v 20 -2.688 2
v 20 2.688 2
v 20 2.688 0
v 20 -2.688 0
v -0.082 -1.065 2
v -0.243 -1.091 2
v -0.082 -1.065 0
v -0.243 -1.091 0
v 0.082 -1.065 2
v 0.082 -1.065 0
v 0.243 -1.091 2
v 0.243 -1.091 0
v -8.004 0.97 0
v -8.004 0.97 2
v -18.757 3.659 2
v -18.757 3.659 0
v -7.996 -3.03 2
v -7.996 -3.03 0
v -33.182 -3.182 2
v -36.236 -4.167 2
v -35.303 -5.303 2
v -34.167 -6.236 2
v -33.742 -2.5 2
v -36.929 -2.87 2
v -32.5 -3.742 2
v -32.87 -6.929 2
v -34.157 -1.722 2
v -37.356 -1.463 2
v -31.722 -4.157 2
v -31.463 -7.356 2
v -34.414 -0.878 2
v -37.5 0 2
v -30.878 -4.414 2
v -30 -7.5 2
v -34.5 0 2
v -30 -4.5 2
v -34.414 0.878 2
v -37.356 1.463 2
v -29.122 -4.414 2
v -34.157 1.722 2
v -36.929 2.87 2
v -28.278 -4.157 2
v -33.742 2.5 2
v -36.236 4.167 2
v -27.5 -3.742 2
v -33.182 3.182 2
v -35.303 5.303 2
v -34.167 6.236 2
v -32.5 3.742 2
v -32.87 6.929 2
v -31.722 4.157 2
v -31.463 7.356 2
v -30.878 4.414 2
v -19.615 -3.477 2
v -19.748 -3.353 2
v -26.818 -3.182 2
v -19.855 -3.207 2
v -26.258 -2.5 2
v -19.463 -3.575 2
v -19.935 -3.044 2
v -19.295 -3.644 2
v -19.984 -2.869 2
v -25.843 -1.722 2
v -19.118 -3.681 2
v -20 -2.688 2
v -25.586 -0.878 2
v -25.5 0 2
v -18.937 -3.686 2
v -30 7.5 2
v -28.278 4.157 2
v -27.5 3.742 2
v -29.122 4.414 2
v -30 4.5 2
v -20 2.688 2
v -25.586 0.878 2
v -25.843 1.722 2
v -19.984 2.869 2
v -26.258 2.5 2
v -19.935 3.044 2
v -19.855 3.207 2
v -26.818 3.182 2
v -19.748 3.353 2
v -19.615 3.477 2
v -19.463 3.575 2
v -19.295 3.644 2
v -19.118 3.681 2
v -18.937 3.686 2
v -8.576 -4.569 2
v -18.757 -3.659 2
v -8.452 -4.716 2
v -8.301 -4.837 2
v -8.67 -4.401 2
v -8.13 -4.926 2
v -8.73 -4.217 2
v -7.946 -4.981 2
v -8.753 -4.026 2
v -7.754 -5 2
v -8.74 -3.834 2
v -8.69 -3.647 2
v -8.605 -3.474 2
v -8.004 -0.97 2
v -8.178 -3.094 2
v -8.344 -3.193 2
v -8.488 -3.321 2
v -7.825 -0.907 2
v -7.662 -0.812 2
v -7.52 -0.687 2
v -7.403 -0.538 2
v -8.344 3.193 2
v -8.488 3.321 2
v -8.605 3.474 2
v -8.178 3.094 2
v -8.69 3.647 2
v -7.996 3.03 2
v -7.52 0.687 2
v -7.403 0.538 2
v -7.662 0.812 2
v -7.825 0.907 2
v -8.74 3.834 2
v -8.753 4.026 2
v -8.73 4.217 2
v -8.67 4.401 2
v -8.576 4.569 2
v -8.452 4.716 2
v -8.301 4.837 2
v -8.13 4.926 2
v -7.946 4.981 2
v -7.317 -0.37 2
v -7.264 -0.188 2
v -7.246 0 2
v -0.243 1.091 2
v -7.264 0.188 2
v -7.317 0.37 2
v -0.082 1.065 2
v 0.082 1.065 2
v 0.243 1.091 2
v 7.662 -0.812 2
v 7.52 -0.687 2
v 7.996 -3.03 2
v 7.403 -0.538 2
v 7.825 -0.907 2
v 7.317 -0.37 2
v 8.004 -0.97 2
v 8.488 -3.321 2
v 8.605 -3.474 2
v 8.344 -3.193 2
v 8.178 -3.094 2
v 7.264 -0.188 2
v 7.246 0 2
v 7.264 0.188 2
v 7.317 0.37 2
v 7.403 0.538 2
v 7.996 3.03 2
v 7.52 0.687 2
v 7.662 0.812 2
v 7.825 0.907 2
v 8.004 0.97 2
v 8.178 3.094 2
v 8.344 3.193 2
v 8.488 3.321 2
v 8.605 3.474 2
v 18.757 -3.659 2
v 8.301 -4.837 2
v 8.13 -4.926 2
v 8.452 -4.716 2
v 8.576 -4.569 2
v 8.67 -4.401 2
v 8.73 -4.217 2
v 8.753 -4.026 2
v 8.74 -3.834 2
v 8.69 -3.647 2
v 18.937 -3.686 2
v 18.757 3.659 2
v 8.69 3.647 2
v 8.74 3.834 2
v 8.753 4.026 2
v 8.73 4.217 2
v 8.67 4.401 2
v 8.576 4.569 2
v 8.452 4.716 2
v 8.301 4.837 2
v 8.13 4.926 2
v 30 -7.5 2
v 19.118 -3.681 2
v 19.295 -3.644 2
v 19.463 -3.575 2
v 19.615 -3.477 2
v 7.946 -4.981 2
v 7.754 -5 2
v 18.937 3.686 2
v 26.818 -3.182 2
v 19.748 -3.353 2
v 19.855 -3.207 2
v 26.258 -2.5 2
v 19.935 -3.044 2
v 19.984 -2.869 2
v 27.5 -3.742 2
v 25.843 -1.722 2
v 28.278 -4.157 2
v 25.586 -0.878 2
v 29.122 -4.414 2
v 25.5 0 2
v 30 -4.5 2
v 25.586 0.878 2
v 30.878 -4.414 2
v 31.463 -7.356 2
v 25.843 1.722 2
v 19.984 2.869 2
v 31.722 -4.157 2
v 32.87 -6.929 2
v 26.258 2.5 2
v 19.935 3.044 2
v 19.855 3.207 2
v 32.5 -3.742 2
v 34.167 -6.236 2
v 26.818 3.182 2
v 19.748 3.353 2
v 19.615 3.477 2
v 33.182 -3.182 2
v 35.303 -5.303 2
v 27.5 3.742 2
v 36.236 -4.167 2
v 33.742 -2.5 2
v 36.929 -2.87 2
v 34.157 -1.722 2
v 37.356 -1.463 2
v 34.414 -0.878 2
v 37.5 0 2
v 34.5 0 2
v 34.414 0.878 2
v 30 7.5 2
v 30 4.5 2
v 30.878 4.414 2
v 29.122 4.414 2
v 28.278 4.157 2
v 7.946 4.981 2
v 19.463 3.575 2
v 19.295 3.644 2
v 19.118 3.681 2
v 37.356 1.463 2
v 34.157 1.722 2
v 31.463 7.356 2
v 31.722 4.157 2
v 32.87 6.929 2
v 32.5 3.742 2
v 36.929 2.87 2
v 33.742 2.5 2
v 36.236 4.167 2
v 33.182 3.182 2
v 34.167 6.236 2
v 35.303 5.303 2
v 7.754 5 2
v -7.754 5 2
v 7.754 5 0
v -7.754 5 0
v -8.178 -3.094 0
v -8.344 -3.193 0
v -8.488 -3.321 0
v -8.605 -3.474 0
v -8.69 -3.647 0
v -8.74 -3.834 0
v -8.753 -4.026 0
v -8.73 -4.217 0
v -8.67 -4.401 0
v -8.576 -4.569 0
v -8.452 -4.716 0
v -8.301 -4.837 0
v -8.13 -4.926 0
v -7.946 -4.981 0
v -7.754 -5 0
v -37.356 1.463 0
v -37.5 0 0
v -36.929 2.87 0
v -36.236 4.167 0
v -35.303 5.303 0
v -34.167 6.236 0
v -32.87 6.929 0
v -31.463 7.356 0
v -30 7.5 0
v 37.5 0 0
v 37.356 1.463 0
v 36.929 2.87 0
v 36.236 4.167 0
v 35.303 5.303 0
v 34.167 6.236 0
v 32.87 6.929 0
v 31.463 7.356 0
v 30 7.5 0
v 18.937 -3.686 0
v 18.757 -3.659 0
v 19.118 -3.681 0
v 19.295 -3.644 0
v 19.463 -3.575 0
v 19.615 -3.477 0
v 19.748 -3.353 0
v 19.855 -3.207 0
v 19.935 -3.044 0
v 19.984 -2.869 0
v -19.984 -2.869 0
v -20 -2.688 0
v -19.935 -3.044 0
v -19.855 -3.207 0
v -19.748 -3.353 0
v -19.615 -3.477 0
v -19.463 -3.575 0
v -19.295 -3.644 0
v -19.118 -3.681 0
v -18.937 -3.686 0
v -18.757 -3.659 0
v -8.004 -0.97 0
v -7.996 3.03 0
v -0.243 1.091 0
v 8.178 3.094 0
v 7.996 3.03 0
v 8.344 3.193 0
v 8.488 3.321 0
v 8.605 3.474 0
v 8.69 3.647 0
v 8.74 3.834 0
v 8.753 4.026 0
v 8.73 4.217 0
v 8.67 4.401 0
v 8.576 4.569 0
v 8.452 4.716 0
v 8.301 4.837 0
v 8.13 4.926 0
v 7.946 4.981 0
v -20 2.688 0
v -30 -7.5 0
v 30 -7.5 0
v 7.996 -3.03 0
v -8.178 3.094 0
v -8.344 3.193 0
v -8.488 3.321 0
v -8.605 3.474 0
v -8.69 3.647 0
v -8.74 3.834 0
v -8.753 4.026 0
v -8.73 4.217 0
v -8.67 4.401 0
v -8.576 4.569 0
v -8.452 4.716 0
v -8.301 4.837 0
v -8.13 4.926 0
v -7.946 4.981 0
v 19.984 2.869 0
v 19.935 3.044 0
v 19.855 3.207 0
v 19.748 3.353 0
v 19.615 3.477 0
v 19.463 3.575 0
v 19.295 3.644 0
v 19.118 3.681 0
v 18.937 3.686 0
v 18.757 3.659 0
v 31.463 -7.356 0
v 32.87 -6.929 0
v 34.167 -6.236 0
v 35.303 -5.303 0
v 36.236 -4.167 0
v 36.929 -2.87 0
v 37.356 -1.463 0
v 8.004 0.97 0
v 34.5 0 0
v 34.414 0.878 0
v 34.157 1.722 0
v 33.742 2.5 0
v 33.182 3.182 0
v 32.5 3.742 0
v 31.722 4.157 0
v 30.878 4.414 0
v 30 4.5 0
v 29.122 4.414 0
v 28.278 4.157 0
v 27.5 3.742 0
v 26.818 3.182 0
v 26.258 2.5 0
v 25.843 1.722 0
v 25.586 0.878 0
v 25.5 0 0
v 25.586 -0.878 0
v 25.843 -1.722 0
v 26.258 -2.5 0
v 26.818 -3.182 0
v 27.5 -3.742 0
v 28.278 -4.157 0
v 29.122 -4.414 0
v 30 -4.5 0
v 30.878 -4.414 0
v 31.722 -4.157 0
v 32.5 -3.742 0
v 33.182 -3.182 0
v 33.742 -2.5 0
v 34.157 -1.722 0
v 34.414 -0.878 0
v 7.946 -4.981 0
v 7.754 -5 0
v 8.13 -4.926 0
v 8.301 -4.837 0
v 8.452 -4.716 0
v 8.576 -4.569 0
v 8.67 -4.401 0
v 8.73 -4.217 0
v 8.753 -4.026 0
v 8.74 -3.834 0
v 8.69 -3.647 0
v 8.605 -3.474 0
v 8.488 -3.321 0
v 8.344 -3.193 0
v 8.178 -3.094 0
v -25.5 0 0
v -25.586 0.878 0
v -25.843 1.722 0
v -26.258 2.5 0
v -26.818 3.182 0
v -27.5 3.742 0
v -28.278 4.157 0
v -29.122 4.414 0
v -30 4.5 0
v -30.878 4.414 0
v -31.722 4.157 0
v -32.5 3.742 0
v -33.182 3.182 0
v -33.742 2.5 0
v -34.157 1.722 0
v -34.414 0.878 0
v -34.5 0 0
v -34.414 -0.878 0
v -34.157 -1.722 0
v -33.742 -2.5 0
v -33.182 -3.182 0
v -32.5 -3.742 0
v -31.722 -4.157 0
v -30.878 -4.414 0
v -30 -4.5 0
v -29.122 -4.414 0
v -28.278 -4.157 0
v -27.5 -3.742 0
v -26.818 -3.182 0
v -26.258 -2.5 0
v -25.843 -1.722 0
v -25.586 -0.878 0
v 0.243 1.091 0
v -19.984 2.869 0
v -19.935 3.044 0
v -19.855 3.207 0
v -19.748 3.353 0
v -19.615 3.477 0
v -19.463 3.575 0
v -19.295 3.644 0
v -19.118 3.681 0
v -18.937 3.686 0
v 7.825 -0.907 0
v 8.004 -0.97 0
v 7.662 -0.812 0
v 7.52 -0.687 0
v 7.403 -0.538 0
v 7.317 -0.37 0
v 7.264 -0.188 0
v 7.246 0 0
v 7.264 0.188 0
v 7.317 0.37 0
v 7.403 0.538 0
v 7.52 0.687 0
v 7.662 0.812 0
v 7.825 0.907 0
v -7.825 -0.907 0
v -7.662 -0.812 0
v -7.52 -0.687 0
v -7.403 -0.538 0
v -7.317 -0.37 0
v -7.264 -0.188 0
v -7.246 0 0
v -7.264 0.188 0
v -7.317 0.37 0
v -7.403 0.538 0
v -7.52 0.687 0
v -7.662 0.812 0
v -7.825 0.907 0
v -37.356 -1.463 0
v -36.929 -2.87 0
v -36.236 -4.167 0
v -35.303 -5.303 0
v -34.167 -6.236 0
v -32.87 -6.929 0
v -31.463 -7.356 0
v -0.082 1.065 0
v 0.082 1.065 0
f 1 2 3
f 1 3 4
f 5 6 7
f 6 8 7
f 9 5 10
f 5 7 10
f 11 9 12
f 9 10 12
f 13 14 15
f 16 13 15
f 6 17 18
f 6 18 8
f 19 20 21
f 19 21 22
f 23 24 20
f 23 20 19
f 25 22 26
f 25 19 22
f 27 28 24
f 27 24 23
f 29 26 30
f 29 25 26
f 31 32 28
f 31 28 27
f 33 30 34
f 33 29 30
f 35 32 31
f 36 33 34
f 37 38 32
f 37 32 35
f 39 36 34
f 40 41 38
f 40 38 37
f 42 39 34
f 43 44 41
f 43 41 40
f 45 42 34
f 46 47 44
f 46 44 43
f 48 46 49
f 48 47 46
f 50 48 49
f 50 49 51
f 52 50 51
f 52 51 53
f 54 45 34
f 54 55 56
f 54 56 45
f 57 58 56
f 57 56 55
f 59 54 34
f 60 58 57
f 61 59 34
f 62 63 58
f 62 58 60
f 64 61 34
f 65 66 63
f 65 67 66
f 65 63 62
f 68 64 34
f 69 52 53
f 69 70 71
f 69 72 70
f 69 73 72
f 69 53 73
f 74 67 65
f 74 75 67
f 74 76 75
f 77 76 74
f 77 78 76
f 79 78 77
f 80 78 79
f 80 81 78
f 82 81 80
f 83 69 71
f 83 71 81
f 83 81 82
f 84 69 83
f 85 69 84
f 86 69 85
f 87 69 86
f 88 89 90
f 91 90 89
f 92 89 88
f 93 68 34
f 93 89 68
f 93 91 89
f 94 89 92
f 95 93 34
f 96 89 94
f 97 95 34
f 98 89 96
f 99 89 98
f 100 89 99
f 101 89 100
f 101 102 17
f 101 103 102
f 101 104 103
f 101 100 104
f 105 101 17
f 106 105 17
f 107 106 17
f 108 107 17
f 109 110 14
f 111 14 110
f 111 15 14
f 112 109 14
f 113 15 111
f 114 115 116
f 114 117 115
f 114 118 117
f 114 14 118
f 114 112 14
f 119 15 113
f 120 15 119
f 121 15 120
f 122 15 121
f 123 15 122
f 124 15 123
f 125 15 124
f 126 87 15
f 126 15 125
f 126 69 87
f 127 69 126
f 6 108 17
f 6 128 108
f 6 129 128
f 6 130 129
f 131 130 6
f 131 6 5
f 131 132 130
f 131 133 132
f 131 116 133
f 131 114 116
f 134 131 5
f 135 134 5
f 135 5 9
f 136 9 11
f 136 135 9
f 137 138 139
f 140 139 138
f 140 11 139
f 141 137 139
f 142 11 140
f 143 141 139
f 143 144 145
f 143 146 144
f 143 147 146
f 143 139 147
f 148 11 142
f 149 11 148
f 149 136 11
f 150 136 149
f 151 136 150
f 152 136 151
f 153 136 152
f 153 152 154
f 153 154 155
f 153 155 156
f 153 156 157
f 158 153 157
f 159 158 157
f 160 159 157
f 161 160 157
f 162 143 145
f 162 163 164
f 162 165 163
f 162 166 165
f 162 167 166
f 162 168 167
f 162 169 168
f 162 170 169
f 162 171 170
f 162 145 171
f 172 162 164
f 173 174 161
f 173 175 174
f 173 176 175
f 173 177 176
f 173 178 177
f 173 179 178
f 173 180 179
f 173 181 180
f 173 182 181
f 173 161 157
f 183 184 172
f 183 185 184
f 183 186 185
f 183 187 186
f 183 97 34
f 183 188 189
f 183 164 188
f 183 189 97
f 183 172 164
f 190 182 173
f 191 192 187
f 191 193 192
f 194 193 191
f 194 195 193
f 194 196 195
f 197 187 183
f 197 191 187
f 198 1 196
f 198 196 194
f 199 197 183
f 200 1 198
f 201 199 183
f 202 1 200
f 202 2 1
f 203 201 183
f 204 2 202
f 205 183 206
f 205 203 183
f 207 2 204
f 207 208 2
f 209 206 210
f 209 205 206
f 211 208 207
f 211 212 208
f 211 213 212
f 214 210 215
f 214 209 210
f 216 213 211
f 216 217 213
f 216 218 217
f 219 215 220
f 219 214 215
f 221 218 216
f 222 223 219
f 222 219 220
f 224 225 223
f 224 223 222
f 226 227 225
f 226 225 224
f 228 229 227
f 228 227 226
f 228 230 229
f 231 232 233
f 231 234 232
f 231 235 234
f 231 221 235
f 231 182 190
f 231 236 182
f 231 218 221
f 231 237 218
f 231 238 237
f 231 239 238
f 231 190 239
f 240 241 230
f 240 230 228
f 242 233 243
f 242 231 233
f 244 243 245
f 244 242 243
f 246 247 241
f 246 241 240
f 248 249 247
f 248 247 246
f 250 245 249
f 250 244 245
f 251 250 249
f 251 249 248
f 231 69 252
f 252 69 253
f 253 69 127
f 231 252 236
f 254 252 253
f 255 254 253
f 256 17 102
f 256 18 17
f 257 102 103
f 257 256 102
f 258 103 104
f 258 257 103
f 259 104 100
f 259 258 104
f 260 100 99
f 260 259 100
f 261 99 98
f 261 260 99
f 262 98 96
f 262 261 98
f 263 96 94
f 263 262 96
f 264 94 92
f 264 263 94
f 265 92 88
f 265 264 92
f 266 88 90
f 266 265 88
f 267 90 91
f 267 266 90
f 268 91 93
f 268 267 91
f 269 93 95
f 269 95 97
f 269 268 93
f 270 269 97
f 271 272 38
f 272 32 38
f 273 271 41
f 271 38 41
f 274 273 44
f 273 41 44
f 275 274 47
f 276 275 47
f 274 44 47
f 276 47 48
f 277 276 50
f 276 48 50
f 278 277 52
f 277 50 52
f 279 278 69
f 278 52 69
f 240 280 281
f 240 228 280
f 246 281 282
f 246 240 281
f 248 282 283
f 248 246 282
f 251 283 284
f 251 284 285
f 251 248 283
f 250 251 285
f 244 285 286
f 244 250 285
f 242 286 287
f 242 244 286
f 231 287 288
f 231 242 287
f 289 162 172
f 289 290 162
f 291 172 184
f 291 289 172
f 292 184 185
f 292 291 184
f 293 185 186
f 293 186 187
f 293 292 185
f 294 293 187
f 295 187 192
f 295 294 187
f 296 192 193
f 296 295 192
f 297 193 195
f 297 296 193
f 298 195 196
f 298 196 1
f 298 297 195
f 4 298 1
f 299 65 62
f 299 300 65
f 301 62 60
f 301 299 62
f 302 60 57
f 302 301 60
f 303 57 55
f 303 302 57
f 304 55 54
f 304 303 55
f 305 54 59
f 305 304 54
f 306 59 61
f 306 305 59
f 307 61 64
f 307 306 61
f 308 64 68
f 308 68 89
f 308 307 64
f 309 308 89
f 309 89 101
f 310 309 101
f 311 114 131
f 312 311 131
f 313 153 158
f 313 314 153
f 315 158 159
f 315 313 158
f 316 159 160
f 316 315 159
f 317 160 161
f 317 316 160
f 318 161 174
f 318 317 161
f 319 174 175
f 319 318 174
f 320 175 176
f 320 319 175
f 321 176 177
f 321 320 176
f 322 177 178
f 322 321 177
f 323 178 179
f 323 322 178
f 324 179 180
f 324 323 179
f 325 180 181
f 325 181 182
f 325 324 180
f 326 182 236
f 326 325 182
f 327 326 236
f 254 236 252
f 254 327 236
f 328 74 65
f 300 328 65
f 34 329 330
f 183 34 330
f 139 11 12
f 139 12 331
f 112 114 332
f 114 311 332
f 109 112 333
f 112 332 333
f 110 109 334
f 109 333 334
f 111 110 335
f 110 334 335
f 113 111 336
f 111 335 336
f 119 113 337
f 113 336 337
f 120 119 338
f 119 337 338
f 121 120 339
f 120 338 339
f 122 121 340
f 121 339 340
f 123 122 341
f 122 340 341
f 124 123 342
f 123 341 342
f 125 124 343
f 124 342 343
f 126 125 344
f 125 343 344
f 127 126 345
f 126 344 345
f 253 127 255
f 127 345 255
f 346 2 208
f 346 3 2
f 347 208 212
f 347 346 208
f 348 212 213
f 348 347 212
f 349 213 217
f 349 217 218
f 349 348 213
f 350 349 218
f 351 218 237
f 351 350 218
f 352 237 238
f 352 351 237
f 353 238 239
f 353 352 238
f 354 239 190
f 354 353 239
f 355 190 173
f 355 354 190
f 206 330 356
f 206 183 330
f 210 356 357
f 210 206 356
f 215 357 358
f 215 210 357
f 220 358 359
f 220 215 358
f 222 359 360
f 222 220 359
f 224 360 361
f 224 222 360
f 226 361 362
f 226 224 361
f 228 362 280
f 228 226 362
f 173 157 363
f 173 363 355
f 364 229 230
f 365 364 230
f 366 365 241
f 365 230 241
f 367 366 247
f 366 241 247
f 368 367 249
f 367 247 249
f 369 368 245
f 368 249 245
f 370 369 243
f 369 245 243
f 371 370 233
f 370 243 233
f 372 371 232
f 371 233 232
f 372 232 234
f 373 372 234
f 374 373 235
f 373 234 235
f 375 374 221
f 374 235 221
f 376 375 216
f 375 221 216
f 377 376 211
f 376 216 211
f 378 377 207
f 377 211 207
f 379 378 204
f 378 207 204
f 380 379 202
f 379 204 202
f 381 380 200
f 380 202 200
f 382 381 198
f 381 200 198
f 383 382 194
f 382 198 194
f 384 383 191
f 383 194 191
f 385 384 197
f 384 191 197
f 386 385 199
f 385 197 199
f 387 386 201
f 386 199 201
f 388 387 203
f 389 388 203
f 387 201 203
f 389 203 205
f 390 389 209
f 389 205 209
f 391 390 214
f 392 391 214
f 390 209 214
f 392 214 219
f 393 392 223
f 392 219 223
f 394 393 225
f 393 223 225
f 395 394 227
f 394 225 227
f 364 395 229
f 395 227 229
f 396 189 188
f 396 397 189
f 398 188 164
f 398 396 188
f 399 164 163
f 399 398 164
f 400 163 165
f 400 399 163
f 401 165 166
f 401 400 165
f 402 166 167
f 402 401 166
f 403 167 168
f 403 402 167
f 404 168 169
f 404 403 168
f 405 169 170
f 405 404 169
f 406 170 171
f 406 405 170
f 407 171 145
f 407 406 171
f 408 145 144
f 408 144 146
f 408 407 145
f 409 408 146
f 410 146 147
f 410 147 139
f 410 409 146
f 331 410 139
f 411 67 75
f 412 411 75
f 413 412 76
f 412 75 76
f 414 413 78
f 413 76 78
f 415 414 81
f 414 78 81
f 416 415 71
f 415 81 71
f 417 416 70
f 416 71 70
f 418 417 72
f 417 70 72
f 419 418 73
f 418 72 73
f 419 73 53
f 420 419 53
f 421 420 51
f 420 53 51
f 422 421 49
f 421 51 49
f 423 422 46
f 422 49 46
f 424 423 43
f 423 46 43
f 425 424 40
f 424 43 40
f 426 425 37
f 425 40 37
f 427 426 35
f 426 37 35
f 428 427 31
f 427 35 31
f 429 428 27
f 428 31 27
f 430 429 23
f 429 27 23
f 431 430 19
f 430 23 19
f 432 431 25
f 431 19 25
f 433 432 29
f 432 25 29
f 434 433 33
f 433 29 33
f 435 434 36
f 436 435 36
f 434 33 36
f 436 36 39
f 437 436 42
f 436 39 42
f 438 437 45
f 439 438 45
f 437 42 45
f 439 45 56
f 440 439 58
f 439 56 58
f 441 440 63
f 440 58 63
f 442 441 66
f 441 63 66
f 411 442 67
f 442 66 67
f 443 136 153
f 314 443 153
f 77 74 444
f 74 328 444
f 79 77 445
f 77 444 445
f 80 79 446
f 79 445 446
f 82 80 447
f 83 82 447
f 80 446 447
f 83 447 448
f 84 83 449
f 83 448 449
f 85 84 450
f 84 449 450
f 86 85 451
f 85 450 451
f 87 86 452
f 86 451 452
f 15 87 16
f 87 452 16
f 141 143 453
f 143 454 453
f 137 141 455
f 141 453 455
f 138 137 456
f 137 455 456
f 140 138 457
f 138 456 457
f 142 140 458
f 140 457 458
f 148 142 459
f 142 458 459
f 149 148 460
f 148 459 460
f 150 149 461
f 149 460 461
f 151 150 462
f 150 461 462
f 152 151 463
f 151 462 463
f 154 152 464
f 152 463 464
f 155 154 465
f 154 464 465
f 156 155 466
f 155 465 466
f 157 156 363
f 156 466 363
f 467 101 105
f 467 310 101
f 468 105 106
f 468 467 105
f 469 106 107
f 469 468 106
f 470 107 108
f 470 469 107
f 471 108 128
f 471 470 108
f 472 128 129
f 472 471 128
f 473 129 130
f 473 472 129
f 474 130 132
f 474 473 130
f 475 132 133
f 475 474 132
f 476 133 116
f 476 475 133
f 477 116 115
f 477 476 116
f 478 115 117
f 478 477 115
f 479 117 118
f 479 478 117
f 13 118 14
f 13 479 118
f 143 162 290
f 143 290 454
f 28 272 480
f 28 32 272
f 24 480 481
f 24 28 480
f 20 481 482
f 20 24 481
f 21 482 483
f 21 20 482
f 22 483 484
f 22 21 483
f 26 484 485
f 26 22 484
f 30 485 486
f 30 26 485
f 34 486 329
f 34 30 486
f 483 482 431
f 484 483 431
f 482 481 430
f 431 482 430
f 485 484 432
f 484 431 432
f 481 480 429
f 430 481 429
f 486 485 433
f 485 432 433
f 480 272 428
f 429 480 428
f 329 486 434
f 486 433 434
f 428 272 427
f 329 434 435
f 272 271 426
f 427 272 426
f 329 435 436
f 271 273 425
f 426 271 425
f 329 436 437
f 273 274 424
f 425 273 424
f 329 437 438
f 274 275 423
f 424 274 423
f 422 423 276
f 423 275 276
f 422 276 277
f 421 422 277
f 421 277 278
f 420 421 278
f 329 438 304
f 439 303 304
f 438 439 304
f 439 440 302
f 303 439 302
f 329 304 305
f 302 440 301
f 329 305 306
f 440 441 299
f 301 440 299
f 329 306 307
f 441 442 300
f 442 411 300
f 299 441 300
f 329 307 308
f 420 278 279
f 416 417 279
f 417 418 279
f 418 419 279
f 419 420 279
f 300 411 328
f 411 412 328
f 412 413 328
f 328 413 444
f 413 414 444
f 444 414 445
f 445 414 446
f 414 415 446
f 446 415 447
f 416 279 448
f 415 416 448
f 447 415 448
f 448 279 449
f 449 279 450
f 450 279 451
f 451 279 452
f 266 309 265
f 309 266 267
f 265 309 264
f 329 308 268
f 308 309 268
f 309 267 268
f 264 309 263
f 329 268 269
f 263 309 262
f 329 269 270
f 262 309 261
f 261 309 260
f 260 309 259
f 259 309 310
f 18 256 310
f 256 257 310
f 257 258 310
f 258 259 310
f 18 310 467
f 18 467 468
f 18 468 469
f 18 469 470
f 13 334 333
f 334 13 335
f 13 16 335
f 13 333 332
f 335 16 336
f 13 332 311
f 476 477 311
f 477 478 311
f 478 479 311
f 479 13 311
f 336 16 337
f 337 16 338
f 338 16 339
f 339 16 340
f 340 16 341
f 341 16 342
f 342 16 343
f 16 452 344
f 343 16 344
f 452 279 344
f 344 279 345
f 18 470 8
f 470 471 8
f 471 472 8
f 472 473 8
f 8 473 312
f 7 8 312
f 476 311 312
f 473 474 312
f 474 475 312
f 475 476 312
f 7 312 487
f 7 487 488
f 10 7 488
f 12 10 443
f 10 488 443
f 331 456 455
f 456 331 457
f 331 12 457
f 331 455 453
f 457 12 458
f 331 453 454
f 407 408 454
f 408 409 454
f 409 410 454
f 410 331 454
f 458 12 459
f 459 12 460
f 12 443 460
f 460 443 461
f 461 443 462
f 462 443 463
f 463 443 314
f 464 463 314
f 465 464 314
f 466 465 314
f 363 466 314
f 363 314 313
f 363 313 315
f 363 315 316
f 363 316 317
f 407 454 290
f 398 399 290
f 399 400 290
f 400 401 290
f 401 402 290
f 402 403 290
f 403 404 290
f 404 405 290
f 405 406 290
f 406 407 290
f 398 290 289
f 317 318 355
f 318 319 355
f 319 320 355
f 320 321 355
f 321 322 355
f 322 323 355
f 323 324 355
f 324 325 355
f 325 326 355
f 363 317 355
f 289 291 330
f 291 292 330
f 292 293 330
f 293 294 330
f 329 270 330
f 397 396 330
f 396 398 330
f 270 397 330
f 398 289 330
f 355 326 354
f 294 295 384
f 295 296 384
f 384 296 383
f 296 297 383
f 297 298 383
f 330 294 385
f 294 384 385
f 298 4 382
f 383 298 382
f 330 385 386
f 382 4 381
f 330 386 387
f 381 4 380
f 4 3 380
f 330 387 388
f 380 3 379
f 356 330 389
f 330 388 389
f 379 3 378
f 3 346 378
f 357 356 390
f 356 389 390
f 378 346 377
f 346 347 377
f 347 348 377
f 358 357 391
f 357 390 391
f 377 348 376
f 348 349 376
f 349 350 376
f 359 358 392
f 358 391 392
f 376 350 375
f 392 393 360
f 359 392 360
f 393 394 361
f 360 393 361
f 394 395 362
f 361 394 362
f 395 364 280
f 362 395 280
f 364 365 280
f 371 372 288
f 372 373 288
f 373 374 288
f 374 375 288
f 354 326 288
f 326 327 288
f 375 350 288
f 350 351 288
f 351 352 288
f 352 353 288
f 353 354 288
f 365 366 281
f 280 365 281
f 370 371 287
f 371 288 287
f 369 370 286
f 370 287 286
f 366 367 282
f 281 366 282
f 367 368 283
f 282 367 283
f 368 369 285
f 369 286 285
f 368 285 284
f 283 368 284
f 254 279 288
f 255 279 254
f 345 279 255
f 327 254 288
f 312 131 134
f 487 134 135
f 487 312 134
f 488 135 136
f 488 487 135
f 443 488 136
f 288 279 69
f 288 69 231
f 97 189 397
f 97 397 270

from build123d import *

# Parameters (mm, degrees)
SKETCH_1_W          = 75
SKETCH_1_H          = 15
EXTRUDE_1_DEPTH     = 2
FILLET_1_R          = 7.5
SKETCH_2_R          = 4.5
CUT_EXTRUDE_1_DEPTH = 2
CUT_EXTRUDE_2_DEPTH = 10
FILLET_2_R          = 1


with BuildPart() as part:
    # 草图1 → 凸台-拉伸1 (new body)
    with BuildSketch(Plane.XY):
        Rectangle(SKETCH_1_W, SKETCH_1_H)
    extrude(amount=EXTRUDE_1_DEPTH)

    # 圆角1
    fillet_1_edges = [part.edges().sort_by_distance(p)[0] for p in [
        (37.5, -7.5, 1),
        (-37.5, -7.5, 1),
        (-37.5, 7.5, 1),
        (37.5, 7.5, 1),
    ]]
    fillet(fillet_1_edges, radius=FILLET_1_R - 0.0001)  # a hair under: the kernel refuses the full size

    # 草图2 → 切除-拉伸1 (cut)
    with BuildSketch(Plane.XY.offset(2)):
        with Locations((30, 0)):
            Circle(SKETCH_2_R)
        with Locations((-30, 0)):
            Circle(SKETCH_2_R)
    extrude(amount=-CUT_EXTRUDE_1_DEPTH, mode=Mode.SUBTRACT)

    # 草图3 → 切除-拉伸2 (cut)
    with BuildSketch(Plane.XY.offset(2)):
        Polygon((4.123105626, 0), (20, 3.969223594), (20, -3.969223594), align=None)
        Polygon((-15.876894374, 5), (0, 1.030776406), (15.876894374, 5), align=None)
        Polygon((0, -1.030776406), (15.876894374, -5), (-15.876894374, -5), align=None)
        Polygon((-20, 3.969223594), (-20, -3.969223594), (-4.123105626, 0), align=None)
    extrude(amount=-CUT_EXTRUDE_2_DEPTH, mode=Mode.SUBTRACT)

    # 圆角2
    fillet_2_edges = [part.edges().sort_by_distance(p)[0] for p in [
        (4.123105626, 0, 1),
        (20, 3.969223594, 1),
        (20, -3.969223594, 1),
        (0, -1.030776406, 1),
        (15.876894374, -5, 1),
        (-15.876894374, -5, 1),
        (-20, -3.969223594, 1),
        (-20, 3.969223594, 1),
        (-4.123105626, 0, 1),
        (0, 1.030776406, 1),
        (-15.876894374, 5, 1),
        (15.876894374, 5, 1),
    ]]
    fillet(fillet_2_edges, radius=FILLET_2_R)


solid = part.part
